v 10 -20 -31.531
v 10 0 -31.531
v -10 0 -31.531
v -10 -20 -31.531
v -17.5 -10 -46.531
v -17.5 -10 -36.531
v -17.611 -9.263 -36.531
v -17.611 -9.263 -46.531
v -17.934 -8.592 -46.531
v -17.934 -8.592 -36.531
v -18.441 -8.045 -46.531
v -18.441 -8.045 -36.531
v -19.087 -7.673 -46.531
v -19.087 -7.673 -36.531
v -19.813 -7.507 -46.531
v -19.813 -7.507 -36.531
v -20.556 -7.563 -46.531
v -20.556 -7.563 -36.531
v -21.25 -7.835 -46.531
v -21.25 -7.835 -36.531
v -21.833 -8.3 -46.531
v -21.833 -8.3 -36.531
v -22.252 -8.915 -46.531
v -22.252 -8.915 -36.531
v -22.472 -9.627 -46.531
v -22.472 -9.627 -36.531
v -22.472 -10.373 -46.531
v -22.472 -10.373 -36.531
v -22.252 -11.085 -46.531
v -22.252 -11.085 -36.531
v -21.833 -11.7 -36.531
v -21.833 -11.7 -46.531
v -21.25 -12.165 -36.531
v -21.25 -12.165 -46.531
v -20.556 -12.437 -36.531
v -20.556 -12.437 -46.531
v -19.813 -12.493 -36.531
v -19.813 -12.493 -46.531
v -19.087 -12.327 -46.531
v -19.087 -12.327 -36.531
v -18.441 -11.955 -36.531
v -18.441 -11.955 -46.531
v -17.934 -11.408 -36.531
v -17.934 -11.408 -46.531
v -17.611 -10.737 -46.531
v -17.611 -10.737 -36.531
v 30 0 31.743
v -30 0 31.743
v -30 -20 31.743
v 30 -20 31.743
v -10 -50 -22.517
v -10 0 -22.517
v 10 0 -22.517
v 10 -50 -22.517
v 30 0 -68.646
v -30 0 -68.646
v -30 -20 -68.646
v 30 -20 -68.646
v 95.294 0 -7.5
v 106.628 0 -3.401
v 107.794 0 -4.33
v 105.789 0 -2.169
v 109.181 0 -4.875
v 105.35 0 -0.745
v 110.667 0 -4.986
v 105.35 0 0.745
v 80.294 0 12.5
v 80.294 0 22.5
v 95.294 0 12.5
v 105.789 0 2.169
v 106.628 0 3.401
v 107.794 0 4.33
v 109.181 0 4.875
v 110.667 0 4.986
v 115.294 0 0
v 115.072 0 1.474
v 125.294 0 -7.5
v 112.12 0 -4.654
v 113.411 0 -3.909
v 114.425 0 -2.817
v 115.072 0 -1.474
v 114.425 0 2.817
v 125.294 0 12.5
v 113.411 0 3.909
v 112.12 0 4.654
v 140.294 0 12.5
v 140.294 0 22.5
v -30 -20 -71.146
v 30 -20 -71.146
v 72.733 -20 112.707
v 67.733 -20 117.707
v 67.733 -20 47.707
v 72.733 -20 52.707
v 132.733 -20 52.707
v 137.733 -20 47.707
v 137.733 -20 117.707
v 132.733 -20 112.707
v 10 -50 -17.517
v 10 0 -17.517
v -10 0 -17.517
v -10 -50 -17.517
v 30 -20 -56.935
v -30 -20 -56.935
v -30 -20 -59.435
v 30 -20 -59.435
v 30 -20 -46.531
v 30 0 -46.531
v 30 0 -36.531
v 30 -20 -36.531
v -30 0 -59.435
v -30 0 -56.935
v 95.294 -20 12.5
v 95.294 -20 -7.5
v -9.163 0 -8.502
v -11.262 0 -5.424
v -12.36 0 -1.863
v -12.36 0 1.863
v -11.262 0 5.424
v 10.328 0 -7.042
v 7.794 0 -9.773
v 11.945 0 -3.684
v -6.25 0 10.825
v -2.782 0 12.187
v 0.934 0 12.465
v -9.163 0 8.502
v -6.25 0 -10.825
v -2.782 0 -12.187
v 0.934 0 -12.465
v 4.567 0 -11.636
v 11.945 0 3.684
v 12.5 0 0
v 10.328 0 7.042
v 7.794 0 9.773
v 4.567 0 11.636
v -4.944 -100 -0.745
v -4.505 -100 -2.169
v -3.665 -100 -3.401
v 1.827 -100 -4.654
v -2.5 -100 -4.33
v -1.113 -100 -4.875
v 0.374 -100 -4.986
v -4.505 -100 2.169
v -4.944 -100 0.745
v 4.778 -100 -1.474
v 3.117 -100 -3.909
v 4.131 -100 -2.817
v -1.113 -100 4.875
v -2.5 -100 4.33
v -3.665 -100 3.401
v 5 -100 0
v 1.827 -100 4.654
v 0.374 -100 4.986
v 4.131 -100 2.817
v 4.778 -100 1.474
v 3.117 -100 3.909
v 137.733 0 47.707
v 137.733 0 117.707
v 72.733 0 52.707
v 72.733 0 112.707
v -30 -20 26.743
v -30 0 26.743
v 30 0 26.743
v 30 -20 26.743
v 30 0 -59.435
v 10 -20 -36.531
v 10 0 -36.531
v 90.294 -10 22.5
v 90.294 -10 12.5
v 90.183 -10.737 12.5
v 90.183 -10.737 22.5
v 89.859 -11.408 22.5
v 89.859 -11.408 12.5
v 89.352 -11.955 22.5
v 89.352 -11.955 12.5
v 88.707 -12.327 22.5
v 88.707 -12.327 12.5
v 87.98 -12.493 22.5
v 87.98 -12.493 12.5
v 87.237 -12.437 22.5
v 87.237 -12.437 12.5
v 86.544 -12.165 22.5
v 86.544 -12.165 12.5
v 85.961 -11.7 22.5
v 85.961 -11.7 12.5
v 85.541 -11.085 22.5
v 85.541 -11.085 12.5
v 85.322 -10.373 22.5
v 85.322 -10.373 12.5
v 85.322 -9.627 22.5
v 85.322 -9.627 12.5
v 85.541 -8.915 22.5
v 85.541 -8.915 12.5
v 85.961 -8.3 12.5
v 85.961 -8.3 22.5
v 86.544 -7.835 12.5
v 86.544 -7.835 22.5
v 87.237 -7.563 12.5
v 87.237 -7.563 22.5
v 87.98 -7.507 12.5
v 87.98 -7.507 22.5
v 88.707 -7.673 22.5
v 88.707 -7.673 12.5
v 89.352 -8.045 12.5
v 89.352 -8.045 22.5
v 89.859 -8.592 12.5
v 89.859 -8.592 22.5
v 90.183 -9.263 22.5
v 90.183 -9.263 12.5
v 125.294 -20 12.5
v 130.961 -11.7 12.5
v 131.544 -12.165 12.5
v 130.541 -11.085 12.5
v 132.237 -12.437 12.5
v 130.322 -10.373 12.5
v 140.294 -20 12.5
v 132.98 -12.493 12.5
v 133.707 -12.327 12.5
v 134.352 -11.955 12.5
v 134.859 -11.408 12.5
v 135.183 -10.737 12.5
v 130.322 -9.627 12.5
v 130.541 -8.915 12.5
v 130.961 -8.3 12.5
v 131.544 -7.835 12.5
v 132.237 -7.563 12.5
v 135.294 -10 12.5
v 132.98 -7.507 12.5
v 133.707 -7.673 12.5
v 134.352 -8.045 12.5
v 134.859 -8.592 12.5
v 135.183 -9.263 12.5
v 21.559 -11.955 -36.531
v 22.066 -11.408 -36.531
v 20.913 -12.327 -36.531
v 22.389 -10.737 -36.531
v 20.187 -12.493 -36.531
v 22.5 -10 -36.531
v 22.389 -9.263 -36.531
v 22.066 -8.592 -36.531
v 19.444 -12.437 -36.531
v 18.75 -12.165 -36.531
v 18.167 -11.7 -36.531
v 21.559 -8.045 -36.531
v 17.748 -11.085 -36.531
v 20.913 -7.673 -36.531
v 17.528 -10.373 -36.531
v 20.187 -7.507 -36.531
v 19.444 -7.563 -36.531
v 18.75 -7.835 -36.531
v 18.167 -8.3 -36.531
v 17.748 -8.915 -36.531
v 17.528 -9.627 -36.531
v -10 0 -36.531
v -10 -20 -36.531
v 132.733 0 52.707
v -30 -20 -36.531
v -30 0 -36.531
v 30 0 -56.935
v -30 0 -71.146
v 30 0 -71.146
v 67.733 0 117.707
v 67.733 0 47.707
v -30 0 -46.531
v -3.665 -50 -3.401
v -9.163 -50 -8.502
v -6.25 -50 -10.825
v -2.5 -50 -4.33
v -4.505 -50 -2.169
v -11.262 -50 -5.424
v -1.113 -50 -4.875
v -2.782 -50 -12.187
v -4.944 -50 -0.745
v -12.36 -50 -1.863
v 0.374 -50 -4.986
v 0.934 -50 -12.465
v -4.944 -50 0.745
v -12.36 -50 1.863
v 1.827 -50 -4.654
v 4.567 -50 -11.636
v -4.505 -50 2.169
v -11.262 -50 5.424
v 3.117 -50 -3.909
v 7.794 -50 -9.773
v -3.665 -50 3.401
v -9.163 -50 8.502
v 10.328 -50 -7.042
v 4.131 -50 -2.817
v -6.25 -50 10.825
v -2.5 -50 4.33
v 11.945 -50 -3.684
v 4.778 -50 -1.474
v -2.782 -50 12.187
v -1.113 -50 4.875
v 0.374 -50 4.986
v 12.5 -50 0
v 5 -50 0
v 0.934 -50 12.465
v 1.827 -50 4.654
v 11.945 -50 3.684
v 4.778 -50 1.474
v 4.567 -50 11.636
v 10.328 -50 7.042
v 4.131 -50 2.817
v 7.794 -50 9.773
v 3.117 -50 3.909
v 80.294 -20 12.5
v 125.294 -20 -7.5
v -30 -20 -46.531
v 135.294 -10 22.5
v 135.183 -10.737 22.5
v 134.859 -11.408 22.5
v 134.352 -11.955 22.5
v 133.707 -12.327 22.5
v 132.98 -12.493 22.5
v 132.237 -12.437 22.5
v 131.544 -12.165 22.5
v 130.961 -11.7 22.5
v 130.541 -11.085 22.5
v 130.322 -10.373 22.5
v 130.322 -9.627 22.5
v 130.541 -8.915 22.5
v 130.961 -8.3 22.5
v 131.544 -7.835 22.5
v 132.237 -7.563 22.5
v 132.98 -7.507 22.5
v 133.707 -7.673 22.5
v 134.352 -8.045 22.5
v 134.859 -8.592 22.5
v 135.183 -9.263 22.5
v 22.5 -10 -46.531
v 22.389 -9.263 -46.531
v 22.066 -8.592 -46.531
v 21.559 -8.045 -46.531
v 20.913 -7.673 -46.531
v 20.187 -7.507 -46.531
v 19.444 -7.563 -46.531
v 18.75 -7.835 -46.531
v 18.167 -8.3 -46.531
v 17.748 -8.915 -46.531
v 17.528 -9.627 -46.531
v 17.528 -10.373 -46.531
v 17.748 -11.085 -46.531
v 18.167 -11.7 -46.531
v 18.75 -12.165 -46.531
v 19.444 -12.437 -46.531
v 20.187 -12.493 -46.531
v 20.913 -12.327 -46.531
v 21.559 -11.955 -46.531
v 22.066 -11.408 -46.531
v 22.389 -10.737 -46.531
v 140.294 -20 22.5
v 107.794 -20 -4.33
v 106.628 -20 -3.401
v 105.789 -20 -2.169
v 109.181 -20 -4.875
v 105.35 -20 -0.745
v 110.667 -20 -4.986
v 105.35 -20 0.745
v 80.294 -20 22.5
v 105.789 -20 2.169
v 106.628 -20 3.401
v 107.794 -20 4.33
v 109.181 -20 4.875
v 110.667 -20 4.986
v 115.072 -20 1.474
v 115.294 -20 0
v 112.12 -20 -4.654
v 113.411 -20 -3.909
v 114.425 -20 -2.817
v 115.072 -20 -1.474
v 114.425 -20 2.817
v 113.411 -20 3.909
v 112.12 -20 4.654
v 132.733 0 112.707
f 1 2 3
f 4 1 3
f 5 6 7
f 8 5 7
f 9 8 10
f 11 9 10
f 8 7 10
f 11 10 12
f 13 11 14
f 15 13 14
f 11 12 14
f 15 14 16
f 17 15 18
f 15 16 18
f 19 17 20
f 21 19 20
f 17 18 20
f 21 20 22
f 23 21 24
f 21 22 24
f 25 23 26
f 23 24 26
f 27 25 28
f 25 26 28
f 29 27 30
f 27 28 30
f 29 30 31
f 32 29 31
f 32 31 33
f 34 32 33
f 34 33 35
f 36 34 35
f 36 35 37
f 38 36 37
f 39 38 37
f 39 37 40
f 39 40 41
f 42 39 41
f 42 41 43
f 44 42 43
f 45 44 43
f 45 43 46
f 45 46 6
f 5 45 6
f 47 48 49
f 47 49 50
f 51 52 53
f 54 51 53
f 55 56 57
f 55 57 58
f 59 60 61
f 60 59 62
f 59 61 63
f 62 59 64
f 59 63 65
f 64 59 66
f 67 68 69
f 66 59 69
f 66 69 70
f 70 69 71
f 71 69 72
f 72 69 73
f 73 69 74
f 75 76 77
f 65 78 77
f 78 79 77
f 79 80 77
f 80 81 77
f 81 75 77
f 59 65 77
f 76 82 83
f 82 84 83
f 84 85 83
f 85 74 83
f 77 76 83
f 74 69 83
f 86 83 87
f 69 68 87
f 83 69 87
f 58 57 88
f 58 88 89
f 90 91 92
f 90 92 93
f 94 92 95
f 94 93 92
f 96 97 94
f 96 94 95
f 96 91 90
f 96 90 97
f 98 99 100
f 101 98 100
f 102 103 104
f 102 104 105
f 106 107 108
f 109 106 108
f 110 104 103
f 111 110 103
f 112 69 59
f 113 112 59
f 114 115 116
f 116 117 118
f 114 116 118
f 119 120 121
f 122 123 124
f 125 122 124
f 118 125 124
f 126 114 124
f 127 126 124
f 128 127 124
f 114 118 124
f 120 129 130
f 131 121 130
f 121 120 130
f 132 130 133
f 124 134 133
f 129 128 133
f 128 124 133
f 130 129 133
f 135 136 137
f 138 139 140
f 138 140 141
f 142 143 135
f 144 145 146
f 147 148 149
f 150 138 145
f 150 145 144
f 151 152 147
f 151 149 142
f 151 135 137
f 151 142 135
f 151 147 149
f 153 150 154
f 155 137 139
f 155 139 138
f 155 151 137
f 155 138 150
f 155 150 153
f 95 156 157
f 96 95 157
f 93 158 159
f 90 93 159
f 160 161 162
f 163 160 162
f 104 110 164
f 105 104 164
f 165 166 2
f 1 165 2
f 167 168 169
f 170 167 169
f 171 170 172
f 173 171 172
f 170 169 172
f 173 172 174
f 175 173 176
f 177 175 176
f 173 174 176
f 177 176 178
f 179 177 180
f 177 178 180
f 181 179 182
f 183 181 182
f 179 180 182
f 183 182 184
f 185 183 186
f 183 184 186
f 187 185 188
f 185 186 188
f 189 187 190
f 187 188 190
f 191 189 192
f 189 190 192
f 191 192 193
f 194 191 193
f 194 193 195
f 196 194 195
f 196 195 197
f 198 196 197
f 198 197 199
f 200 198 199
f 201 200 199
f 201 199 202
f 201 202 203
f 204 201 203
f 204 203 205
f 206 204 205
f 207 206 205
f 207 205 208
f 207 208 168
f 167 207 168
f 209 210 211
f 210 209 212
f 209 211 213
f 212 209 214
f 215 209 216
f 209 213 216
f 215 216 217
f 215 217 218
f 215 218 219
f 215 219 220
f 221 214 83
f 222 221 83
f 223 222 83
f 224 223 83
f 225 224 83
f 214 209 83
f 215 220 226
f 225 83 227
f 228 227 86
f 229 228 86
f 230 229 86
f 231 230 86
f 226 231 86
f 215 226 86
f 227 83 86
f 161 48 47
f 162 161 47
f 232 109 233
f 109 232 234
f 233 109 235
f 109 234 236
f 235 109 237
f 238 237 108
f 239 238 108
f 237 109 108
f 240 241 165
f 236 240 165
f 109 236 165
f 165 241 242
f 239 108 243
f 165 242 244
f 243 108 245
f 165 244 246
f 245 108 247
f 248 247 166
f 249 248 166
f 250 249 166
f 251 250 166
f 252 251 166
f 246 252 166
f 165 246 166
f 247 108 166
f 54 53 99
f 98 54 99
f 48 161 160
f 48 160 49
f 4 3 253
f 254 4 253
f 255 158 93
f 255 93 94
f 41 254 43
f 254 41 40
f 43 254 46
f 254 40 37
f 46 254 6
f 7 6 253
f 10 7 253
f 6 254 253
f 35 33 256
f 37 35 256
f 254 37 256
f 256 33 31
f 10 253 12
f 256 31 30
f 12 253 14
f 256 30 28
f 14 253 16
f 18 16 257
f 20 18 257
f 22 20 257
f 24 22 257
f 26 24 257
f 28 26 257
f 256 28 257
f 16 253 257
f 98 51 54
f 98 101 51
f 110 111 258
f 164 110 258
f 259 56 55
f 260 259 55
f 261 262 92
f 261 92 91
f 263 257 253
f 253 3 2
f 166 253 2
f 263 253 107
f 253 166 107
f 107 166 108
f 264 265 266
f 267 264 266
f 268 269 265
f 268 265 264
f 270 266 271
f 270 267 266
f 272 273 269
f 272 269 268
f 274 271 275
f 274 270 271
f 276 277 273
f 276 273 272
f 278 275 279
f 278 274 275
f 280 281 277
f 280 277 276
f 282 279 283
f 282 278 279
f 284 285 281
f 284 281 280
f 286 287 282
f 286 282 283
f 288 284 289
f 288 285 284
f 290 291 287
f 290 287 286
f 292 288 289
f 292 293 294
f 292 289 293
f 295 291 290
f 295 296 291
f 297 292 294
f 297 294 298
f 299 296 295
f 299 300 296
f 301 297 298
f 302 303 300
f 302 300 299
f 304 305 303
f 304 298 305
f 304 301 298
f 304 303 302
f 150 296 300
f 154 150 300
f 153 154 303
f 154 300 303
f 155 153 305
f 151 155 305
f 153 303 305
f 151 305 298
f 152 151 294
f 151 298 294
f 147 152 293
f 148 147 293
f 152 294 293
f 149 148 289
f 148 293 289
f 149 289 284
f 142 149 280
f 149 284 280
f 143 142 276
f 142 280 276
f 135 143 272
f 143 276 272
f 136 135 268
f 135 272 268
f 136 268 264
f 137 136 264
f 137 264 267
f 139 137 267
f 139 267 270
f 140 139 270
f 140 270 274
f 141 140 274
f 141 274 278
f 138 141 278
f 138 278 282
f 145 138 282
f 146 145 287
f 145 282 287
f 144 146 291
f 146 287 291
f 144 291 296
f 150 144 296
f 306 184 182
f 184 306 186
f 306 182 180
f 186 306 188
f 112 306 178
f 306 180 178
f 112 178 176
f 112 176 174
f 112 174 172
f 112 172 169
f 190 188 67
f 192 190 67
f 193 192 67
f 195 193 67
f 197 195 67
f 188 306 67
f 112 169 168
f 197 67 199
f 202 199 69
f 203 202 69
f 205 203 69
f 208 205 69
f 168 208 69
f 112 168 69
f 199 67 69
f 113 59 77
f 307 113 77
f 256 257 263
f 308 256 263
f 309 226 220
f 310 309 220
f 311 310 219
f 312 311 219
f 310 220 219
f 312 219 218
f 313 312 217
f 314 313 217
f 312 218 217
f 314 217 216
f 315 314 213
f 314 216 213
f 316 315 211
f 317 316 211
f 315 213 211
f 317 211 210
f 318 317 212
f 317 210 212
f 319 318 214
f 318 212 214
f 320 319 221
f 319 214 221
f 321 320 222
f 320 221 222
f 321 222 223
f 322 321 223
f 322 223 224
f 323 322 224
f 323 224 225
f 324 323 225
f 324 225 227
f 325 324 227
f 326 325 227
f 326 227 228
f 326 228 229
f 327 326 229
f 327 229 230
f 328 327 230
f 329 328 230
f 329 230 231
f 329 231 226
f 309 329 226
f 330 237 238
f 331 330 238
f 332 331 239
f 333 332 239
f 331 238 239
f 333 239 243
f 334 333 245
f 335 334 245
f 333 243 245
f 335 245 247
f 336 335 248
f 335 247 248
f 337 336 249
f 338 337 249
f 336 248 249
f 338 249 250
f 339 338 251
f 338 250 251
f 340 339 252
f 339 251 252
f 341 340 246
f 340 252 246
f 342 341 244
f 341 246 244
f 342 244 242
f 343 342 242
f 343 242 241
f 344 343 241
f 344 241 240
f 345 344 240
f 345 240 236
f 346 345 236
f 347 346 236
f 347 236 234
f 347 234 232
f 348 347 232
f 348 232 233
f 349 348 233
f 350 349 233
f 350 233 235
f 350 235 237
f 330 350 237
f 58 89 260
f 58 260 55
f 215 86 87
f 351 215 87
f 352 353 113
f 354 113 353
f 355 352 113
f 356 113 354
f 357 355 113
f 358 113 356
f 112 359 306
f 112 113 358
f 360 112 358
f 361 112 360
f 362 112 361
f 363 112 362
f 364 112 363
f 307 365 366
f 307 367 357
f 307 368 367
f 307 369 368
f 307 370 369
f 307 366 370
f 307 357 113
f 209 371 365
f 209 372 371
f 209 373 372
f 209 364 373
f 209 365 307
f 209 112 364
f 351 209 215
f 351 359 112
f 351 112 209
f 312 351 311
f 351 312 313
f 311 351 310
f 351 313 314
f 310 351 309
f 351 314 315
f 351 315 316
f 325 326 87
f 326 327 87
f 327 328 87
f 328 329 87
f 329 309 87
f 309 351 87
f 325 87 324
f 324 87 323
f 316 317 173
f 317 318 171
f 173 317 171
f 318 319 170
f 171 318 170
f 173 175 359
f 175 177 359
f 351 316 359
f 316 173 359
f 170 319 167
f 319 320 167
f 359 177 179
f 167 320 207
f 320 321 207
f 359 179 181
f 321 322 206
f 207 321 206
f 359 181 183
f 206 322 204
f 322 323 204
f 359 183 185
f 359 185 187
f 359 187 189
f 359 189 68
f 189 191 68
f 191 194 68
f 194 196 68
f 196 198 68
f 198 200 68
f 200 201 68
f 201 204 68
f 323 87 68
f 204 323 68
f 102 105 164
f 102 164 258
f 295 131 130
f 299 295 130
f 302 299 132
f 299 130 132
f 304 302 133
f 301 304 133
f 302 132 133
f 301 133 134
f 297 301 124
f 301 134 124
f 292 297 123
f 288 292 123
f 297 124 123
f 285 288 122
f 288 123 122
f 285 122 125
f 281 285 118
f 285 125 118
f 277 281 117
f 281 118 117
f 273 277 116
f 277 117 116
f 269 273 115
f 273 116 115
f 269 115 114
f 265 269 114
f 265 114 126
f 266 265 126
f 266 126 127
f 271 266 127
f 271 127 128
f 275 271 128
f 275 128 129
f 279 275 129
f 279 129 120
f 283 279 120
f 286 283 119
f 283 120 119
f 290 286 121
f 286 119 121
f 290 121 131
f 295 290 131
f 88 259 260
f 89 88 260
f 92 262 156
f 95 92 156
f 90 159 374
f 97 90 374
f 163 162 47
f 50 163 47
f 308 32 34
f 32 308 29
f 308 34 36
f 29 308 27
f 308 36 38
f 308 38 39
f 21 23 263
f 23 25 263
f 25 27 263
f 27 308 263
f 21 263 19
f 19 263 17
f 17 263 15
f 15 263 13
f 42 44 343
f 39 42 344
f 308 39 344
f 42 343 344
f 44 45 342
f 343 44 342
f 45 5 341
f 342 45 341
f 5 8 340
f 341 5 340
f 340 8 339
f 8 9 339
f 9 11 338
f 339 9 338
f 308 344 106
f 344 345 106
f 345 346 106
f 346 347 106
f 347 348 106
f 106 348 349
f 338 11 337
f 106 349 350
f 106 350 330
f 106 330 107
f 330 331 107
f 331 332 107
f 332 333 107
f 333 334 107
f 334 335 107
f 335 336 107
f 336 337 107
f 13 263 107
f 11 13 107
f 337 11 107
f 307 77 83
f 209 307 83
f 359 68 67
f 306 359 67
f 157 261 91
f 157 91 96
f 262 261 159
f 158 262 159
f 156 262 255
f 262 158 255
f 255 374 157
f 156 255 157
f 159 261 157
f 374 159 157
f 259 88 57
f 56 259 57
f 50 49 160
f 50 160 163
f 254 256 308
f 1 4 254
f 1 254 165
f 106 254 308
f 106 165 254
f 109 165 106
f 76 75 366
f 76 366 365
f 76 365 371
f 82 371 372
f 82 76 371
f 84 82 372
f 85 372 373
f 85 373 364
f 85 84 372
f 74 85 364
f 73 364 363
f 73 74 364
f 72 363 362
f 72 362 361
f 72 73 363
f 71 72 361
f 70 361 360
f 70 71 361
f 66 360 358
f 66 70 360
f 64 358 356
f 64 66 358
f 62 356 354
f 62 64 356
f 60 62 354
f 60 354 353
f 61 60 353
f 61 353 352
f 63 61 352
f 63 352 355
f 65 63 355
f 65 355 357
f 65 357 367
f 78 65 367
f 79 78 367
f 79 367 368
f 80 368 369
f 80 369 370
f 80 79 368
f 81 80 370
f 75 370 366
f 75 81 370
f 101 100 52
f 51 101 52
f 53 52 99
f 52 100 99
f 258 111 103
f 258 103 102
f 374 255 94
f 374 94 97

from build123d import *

# Parameters (mm, degrees)
F0_R      = 5
F1_DEPTH  = 20
F0_W      = 60
F0_H      = 5
F0_W_2    = 70
F0_H_2    = 70
F0_H_3    = 60
F0_H_4    = 2.5
F0_R_2    = 12.5
F2_DEPTH  = 50
F3_R      = 5
F4_DEPTH  = 50
F5_DEPTH  = 50
F6_R      = 2.5
F7_R      = 2.5
F8_DEPTH  = 25
F10_R     = 2.5
F9_R      = 2.5
F11_DEPTH = 25


# Not quite as in the source:
# - a feature of the source that left no trace in its solid (it failed there, or was rolled back) is left out


with BuildPart() as f1:
    # F0 (on Front) → F1 (new body)
    with BuildSketch(Plane.XZ):
        Polygon((95.2936565876, -7.5), (110.2936565876, -7.5), (125.2936565876, -7.5), (125.2936565876, 12.5), (140.2936565876, 12.5), (140.2936565876, 22.5), (110.2936565876, 22.5), (80.2936565876, 22.5), (80.2936565876, 12.5), (95.2936565876, 12.5), align=None)
        with Locations((110.2936565876, 0)):
            Circle(F0_R, mode=Mode.SUBTRACT)
    extrude(amount=F1_DEPTH)

    # F10 (on face) + F9 (on face) → F11 (cut)
    with BuildSketch(Plane(origin=(0, 0, 12.5), x_dir=(1, 0, 0), z_dir=(0, 0, -1))):
        with Locations((87.7936565876, 10)):
            Circle(F10_R)
    with BuildSketch(Plane(origin=(0, 0, 12.5), x_dir=(1, 0, 0), z_dir=(0, 0, -1))):
        with Locations((132.7936565876, 10)):
            Circle(F9_R)
    extrude(amount=-F11_DEPTH, mode=Mode.SUBTRACT)


with BuildPart() as f1b:
    # F0 (on Front) → F1, piece 2 (new body)
    with BuildSketch(Plane.XZ):
        with Locations((0, 29.2427036911)):
            Rectangle(F0_W, F0_H)
    extrude(amount=F1_DEPTH)


with BuildPart() as f1c:
    # F0 (on Front) → F1, piece 3 (new body)
    with BuildSketch(Plane.XZ):
        Polygon((10, -31.5313972533), (0, -31.5313972533), (-10, -31.5313972533), (-10, -36.5313972533), (-30, -36.5313972533), (-30, -46.5313972533), (0, -46.5313972533), (30, -46.5313972533), (30, -36.5313972533), (10, -36.5313972533), align=None)
    extrude(amount=F1_DEPTH)

    # F6 (on face) + F7 (on face) → F8 (cut)
    with BuildSketch(Plane.XY.offset(-36.5313972533)):
        with Locations((-20, -10)):
            Circle(F6_R)
    with BuildSketch(Plane.XY.offset(-36.5313972533)):
        with Locations((20, -10)):
            Circle(F7_R)
    extrude(amount=-F8_DEPTH, mode=Mode.SUBTRACT)


with BuildPart() as f1d:
    # F0 (on Front) → F1, piece 4 (new body)
    with BuildSketch(Plane.XZ):
        with Locations((102.7326732874, 82.7068325877)):
            Rectangle(F0_W_2, F0_H_2)
        with Locations((102.7326732874, 82.7068325877)):
            Rectangle(F0_W, F0_H_3, mode=Mode.SUBTRACT)
    extrude(amount=F1_DEPTH)


with BuildPart() as f1e:
    # F0 (on Front) → F1, piece 5 (new body)
    with BuildSketch(Plane.XZ):
        with Locations((0, -58.184633702)):
            Rectangle(F0_W, F0_H_4)
    extrude(amount=F1_DEPTH)


with BuildPart() as f1f:
    # F0 (on Front) → F1, piece 6 (new body)
    with BuildSketch(Plane.XZ):
        with Locations((0, -69.8959429562)):
            Rectangle(F0_W, F0_H_4)
    extrude(amount=F1_DEPTH)


with BuildPart() as f2:
    # F0 (on Front) → F2 (new body)
    with BuildSketch(Plane.XZ):
        Circle(F0_R_2)
    extrude(amount=F2_DEPTH)

    # F3 (on face) → F4 (join)
    with BuildSketch(Plane.XZ.offset(50)):
        Circle(F3_R)
    extrude(amount=F4_DEPTH)


with BuildPart() as f5:
    # F0 (on Front) → F5 (new body)
    with BuildSketch(Plane.XZ):
        Polygon((-10, -22.5167013705), (0, -22.5167013705), (10, -22.5167013705), (10, -17.5167013705), (0, -17.5167013705), (-10, -17.5167013705), align=None)
    extrude(amount=F5_DEPTH)


solid = Compound([f1.part, f1b.part, f1c.part, f1d.part, f1e.part, f1f.part, f2.part, f5.part])
